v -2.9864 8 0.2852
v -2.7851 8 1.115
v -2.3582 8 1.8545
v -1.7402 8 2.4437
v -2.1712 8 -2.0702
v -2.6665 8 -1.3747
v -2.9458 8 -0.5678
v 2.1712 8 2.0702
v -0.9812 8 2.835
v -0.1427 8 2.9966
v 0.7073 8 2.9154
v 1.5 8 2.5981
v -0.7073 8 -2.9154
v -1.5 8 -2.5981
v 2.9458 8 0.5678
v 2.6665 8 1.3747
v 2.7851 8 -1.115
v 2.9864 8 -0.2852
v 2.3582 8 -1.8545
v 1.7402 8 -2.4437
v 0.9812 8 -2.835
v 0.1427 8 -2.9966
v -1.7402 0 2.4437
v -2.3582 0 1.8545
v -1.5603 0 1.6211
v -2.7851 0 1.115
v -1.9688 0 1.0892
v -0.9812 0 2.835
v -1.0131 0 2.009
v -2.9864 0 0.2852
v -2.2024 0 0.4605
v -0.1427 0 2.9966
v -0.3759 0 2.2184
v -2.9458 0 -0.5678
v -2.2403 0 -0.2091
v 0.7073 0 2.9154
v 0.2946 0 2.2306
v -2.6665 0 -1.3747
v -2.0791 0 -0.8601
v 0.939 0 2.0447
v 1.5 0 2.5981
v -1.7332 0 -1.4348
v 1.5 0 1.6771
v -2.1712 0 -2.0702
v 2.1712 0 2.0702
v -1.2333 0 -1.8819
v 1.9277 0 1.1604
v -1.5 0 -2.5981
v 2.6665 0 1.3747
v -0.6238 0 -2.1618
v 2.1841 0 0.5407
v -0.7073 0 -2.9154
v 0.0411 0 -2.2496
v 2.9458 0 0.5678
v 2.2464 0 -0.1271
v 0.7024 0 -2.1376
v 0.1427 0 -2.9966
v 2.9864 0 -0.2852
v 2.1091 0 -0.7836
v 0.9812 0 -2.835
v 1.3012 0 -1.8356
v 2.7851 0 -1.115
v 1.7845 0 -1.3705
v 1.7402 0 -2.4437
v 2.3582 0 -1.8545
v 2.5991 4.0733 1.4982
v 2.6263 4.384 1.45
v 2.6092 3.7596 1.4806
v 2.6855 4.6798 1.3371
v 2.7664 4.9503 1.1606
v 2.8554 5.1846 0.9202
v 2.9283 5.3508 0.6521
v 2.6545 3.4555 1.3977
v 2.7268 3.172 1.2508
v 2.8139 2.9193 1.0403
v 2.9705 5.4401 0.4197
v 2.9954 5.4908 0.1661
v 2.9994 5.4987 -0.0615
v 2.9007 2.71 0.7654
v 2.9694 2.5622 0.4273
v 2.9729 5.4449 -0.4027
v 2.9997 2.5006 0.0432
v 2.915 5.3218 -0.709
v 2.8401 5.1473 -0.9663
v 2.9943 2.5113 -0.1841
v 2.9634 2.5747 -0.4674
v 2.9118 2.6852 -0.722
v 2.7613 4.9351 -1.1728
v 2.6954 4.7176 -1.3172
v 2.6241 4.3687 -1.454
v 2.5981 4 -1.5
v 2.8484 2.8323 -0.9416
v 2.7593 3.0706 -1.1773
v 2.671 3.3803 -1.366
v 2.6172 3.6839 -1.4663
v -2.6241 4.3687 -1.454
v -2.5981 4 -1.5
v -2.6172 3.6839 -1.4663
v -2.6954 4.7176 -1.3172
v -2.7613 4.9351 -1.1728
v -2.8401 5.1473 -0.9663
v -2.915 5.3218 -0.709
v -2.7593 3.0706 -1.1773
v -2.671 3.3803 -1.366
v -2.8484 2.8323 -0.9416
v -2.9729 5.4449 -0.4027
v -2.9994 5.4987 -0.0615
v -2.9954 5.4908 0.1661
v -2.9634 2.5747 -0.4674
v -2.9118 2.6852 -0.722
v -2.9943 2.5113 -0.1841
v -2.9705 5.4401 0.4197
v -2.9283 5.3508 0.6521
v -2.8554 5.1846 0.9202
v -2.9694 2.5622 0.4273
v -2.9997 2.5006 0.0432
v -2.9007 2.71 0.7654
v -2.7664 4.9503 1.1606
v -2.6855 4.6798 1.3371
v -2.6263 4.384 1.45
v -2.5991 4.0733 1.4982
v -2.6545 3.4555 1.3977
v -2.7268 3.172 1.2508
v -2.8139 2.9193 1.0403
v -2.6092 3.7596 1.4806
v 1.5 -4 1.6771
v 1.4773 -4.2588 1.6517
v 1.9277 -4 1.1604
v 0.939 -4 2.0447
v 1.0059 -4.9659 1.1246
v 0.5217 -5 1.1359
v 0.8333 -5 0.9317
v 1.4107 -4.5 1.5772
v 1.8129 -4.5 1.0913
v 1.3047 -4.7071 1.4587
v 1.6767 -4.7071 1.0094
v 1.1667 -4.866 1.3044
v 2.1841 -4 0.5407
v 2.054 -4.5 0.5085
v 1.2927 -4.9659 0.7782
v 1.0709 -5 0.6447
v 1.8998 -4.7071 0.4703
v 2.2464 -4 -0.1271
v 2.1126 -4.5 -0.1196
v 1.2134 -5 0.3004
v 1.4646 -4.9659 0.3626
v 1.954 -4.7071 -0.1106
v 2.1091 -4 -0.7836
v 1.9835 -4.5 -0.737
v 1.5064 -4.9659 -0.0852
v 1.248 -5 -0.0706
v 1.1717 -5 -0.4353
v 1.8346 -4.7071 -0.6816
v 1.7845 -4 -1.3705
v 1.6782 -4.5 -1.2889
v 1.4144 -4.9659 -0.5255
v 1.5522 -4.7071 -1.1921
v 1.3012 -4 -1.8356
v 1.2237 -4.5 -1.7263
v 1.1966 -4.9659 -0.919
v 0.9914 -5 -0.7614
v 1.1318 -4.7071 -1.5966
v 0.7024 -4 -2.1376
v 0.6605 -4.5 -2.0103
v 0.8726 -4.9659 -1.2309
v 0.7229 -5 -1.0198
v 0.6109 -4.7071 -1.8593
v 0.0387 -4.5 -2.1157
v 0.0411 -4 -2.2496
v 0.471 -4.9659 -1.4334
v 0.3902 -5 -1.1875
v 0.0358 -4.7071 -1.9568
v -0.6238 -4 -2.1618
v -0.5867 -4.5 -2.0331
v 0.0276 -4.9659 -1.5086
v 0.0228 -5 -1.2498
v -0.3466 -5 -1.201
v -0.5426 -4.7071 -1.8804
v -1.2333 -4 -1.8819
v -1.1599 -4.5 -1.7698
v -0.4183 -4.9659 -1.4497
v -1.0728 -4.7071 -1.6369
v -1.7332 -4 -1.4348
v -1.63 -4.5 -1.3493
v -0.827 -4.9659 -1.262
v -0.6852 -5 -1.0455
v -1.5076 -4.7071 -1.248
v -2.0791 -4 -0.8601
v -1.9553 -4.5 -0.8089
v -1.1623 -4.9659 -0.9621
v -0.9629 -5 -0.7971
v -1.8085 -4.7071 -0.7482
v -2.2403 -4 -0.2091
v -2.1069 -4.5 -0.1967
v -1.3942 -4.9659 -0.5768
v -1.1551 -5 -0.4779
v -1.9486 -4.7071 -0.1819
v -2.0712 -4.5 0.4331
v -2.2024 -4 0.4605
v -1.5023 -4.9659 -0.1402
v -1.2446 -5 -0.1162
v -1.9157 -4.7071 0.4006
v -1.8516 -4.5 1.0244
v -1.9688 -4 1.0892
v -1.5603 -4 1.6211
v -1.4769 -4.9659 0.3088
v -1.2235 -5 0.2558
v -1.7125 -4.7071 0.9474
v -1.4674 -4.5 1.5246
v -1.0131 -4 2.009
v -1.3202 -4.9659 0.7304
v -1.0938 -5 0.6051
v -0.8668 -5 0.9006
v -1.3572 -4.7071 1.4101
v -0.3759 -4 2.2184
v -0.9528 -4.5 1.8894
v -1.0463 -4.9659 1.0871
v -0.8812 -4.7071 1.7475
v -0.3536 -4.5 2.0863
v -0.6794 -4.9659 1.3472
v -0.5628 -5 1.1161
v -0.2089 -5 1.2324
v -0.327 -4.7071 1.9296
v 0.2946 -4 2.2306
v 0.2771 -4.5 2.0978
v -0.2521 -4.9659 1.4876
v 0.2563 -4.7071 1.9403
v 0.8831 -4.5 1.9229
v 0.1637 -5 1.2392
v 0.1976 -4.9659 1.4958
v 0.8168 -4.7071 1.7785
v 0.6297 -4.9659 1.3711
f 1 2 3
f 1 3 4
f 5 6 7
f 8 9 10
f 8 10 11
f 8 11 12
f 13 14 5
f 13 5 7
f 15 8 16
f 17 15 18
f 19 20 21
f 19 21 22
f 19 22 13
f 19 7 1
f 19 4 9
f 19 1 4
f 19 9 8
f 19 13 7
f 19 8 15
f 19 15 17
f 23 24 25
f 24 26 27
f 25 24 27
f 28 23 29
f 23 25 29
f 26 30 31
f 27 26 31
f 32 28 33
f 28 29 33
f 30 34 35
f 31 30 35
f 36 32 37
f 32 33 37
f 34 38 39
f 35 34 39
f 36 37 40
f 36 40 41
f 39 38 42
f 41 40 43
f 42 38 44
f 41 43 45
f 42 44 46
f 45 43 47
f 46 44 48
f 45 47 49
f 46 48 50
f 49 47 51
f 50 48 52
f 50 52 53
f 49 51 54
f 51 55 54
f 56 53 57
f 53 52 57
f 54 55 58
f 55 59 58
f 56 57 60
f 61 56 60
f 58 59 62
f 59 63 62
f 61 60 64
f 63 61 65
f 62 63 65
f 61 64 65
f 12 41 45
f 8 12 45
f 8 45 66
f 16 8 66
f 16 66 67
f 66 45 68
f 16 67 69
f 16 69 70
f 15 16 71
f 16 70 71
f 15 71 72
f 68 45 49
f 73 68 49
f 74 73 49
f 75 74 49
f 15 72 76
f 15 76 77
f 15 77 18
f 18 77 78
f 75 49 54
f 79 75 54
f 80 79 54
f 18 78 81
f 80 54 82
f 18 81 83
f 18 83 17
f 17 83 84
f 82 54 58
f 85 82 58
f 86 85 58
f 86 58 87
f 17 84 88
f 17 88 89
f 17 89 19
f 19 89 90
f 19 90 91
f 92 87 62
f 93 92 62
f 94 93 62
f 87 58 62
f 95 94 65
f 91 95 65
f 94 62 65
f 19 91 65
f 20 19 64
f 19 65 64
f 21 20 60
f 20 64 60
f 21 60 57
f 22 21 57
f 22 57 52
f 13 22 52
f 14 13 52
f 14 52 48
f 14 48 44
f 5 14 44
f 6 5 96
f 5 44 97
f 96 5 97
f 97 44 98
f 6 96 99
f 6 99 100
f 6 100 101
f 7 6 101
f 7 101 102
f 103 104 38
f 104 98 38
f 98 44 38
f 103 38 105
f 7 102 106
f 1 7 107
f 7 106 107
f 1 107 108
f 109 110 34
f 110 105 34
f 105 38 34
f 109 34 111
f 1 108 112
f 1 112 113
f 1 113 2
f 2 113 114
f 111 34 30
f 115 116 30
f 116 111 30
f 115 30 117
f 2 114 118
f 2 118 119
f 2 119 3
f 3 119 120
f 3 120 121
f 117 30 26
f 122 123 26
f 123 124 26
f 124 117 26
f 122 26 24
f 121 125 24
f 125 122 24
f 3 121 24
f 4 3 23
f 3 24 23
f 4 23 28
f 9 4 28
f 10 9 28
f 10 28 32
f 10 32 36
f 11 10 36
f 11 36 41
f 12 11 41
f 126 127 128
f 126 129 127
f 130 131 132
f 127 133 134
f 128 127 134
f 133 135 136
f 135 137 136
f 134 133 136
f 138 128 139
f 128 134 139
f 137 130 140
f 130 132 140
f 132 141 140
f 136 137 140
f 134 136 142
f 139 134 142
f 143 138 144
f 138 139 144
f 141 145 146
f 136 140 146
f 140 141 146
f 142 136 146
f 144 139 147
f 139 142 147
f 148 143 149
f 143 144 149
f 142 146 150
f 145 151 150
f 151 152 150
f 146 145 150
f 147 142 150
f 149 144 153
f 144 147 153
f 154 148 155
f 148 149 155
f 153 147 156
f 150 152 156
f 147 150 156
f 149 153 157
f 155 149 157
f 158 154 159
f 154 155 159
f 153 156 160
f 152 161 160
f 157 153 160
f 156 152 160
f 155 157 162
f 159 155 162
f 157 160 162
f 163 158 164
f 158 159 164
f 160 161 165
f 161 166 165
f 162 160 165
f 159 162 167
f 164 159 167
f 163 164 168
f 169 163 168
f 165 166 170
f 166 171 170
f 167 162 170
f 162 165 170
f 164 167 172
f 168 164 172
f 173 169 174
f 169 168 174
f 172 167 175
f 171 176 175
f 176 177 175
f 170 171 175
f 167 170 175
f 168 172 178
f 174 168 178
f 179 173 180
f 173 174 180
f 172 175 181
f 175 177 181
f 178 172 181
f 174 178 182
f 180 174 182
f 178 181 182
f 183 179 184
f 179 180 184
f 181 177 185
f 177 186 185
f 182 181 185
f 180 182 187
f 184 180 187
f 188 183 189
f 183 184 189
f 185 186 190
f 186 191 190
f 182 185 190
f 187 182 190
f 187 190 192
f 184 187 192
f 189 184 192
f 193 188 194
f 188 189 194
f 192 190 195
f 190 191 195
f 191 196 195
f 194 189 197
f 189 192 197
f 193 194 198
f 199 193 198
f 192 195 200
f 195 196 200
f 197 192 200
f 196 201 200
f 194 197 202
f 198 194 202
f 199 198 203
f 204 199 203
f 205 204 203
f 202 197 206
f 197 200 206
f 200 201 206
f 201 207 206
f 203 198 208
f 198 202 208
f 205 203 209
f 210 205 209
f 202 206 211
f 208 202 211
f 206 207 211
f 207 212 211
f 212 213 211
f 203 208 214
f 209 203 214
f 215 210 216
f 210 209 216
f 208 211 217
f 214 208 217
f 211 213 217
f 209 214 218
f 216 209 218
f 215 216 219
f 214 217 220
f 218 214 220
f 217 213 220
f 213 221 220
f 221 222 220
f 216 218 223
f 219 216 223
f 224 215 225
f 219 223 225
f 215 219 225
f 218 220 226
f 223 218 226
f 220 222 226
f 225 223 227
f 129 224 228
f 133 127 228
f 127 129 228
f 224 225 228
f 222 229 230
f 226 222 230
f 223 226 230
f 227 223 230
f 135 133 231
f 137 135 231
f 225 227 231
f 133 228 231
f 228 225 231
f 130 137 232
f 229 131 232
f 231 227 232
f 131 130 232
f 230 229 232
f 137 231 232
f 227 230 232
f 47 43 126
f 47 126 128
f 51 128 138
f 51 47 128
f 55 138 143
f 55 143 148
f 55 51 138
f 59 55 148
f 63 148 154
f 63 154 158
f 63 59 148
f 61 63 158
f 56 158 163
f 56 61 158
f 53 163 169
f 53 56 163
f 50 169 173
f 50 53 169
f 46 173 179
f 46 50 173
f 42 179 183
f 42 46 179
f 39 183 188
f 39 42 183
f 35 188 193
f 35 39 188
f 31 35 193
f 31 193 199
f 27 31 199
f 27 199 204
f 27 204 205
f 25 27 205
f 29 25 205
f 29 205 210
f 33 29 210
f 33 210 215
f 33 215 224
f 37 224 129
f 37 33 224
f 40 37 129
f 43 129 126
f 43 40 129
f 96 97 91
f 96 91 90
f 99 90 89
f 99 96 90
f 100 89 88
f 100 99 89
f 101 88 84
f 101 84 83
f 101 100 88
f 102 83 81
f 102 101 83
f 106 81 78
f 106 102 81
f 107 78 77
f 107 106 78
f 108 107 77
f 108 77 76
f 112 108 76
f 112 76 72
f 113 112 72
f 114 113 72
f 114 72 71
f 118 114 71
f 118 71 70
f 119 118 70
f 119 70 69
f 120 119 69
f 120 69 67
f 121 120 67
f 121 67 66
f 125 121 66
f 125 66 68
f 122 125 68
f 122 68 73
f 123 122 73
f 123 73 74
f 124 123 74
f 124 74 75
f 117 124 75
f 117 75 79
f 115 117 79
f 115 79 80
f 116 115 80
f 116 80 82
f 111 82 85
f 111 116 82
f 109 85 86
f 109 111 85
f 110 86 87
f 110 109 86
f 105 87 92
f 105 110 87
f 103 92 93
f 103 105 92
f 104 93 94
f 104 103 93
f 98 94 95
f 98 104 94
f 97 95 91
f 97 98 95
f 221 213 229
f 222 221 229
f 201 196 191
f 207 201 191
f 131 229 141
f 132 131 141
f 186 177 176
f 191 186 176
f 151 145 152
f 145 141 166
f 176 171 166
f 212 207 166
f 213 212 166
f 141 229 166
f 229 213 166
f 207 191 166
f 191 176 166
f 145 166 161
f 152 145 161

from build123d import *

# Parameters (mm, degrees)
SKETCH1_R               = 3
BOSS_EXTRUDE1_DEPTH     = 2
SKETCH1_4_R             = 3
BOSS_EXTRUDE2_DEPTH     = 8
SKETCH1_5_R             = 2.25
BOSS_EXTRUDE3_DEPTH     = 5
CUT_EXTRUDE1_DEPTH      = 10.055385138
CUT_EXTRUDE1_DEPTH_BACK = 10.055385138
SKETCH2_R               = 1.5
FILLET1_R               = 1


with BuildPart() as part:
    # Sketch1 → Boss-Extrude1 (new body)
    with BuildSketch(Plane(origin=(0, 0, 0), x_dir=(1, 0, 0), z_dir=(0, 1, 0))):
        Circle(SKETCH1_R)
        with BuildLine():
            Line((1.5, 1.677050983), (1.5, -1.677050983))
            ThreePointArc((1.5, -1.677050983), (0, -2.25), (-1.5, -1.677050983))
            Line((-1.5, -1.677050983), (-1.5, 1.677050983))
            ThreePointArc((-1.5, 1.677050983), (0, 2.25), (1.5, 1.677050983))
        make_face(mode=Mode.SUBTRACT)
    extrude(amount=BOSS_EXTRUDE1_DEPTH)

    # Sketch1<4> → Boss-Extrude2 (add)
    with BuildSketch(Plane(origin=(0, 0, 0), x_dir=(1, 0, 0), z_dir=(0, 1, 0))):
        Circle(SKETCH1_4_R)
    extrude(amount=BOSS_EXTRUDE2_DEPTH)

    # Sketch1<5> → Boss-Extrude3 (add)
    with BuildSketch(Plane(origin=(0, 0, 0), x_dir=(1, 0, 0), z_dir=(0, 1, 0))):
        Circle(SKETCH1_5_R)
    extrude(amount=-BOSS_EXTRUDE3_DEPTH)

    # Sketch2 → Cut-Extrude1 (cut, two sides: drawn at the far end of the back side and taken through both)
    with BuildSketch(Plane(origin=(0, 0, 0), x_dir=(0, 0, -1), z_dir=(1, 0, 0)).offset(-CUT_EXTRUDE1_DEPTH_BACK)):
        with Locations((0, 4)):
            Circle(SKETCH2_R)
    extrude(amount=CUT_EXTRUDE1_DEPTH + CUT_EXTRUDE1_DEPTH_BACK, mode=Mode.SUBTRACT)

    # Fillet1
    fillet1_edges = [part.edges().sort_by_distance(p)[0] for p in [
        (-2.25, -5, 0),
    ]]
    fillet(fillet1_edges, radius=FILLET1_R)


solid = part.part
